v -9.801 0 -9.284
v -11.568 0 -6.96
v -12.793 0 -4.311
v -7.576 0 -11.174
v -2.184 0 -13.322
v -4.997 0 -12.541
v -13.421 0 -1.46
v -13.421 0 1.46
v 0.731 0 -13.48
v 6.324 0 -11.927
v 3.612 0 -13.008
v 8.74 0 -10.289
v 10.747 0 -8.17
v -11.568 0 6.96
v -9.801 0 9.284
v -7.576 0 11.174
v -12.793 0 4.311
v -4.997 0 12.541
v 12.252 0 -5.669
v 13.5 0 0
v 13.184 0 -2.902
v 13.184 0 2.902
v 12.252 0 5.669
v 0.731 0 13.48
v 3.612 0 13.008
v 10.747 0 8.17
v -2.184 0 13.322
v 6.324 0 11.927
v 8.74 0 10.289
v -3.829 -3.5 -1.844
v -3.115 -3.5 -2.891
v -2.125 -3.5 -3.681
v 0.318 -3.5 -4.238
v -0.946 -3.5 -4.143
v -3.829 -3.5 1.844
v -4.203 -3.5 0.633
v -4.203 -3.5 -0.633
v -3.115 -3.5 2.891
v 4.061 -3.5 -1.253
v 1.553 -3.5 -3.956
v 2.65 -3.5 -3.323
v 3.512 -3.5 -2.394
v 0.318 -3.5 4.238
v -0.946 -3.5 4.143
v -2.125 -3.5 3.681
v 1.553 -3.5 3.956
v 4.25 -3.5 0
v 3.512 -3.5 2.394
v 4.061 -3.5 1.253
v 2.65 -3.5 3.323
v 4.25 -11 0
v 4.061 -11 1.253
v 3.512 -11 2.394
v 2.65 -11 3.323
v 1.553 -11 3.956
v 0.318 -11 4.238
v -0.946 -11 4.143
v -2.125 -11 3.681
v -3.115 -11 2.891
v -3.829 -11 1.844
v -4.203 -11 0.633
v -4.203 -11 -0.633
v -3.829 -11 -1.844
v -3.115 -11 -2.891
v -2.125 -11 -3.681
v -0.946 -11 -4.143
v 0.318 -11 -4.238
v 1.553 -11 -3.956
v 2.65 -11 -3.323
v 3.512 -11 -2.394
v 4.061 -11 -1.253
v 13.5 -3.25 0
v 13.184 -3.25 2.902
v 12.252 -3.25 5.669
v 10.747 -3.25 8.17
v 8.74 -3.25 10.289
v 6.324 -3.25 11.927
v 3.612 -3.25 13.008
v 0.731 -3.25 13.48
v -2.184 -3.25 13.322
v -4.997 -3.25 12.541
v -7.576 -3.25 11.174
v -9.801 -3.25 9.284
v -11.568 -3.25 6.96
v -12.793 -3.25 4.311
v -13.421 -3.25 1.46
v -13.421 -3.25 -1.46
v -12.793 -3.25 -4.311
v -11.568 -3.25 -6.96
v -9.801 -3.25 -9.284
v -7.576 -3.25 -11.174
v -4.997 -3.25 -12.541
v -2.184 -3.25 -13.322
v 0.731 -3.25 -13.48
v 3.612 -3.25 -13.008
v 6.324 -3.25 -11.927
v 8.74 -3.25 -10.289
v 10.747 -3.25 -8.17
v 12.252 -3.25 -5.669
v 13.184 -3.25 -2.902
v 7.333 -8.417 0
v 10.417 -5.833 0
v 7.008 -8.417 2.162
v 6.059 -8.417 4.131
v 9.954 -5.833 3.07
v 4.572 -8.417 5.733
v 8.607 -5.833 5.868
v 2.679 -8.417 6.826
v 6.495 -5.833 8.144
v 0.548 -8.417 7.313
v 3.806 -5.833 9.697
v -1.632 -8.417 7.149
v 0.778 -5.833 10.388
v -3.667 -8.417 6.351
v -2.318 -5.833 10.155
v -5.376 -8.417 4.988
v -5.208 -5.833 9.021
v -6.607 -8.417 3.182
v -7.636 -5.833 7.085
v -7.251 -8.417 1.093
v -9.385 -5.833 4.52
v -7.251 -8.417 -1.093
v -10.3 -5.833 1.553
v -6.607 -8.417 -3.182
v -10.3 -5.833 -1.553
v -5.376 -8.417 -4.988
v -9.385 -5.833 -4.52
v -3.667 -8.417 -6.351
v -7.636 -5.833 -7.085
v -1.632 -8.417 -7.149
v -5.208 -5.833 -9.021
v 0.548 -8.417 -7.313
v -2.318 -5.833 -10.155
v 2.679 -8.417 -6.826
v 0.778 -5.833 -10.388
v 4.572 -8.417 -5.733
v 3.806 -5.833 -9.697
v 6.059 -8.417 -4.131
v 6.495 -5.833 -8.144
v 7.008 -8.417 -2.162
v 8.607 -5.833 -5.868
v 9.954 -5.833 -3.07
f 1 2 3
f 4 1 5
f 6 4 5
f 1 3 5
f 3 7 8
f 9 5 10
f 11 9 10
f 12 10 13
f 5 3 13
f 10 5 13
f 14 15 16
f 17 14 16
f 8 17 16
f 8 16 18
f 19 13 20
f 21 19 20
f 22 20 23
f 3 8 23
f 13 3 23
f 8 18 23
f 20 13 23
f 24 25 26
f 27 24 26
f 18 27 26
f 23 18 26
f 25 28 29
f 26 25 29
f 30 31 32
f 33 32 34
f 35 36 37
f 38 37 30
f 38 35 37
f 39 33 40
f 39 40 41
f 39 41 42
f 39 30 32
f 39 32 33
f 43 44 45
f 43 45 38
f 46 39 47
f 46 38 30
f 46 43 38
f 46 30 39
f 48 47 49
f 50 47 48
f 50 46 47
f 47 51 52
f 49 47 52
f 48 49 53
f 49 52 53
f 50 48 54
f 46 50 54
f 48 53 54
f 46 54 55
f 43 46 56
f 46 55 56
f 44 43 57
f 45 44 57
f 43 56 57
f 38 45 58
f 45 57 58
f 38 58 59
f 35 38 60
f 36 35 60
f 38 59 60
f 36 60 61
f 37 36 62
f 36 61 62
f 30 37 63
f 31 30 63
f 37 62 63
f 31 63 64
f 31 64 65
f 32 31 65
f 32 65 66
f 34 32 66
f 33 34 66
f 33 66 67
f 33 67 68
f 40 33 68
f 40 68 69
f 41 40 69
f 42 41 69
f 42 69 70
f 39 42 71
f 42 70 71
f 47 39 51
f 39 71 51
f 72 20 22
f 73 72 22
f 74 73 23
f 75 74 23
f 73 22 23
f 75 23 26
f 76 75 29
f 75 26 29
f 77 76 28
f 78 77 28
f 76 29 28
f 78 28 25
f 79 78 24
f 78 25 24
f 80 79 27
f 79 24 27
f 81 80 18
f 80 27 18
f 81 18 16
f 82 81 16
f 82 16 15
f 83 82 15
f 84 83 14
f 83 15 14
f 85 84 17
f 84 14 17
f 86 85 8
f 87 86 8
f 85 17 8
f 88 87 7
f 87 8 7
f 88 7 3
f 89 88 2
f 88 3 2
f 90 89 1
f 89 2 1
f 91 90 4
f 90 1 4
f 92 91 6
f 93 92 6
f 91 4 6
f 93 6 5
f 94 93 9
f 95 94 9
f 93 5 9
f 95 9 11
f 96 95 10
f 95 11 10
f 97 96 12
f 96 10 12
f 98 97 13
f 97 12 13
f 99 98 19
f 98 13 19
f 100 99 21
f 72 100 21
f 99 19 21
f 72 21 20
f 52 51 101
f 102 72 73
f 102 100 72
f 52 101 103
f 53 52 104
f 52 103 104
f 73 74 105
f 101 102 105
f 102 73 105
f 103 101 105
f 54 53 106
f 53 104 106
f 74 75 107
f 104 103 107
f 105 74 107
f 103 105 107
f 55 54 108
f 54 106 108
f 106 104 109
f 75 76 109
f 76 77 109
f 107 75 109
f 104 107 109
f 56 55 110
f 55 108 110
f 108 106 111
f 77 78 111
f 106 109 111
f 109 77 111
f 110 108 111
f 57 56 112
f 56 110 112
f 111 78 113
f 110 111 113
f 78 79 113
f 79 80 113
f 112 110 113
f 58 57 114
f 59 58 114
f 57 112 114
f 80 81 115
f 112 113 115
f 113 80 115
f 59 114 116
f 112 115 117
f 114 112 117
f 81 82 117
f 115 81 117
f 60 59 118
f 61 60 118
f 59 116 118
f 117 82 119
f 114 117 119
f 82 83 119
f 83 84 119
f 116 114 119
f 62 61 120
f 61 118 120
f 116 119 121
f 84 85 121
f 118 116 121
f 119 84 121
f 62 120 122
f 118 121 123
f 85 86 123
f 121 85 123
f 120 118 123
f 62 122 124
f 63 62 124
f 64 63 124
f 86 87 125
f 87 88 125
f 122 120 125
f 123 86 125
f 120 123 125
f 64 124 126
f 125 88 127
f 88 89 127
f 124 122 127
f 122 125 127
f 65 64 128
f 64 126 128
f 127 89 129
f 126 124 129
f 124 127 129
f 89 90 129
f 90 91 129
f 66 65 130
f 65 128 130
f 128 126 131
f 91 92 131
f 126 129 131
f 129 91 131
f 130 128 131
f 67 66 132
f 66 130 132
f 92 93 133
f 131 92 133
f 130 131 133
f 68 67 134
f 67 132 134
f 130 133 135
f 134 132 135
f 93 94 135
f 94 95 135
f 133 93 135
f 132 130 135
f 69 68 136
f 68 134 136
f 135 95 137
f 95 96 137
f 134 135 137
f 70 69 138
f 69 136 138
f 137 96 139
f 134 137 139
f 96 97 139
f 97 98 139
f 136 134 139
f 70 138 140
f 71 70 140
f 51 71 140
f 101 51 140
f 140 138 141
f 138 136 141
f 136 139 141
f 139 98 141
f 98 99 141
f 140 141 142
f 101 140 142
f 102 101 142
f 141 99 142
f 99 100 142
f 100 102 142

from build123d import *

# Parameters (mm, degrees)
F0_R      = 13.5
F1_DEPTH  = 3.25
F3_R      = 4.25
F1_FACE_R = 13.5
F5_R      = 4.25
F6_DEPTH  = 7.5


with BuildPart() as f1:
    # F0 (on Front) → F1 (new body)
    with BuildSketch(Plane.XZ):
        Circle(F0_R)
    extrude(amount=F1_DEPTH)

    # F3 (on offset) → F4 section 0
    with BuildSketch(Plane.XZ.offset(11)):
        Circle(F3_R)
    # F1_face (on face) → F4 section 1
    with BuildSketch(Plane.XZ.offset(3.25)):
        Circle(F1_FACE_R)
    loft()

    # F5 (on face) → F6 (cut)
    with BuildSketch(Plane.XZ.offset(11)):
        Circle(F5_R)
    extrude(amount=-F6_DEPTH, mode=Mode.SUBTRACT)


solid = f1.part
